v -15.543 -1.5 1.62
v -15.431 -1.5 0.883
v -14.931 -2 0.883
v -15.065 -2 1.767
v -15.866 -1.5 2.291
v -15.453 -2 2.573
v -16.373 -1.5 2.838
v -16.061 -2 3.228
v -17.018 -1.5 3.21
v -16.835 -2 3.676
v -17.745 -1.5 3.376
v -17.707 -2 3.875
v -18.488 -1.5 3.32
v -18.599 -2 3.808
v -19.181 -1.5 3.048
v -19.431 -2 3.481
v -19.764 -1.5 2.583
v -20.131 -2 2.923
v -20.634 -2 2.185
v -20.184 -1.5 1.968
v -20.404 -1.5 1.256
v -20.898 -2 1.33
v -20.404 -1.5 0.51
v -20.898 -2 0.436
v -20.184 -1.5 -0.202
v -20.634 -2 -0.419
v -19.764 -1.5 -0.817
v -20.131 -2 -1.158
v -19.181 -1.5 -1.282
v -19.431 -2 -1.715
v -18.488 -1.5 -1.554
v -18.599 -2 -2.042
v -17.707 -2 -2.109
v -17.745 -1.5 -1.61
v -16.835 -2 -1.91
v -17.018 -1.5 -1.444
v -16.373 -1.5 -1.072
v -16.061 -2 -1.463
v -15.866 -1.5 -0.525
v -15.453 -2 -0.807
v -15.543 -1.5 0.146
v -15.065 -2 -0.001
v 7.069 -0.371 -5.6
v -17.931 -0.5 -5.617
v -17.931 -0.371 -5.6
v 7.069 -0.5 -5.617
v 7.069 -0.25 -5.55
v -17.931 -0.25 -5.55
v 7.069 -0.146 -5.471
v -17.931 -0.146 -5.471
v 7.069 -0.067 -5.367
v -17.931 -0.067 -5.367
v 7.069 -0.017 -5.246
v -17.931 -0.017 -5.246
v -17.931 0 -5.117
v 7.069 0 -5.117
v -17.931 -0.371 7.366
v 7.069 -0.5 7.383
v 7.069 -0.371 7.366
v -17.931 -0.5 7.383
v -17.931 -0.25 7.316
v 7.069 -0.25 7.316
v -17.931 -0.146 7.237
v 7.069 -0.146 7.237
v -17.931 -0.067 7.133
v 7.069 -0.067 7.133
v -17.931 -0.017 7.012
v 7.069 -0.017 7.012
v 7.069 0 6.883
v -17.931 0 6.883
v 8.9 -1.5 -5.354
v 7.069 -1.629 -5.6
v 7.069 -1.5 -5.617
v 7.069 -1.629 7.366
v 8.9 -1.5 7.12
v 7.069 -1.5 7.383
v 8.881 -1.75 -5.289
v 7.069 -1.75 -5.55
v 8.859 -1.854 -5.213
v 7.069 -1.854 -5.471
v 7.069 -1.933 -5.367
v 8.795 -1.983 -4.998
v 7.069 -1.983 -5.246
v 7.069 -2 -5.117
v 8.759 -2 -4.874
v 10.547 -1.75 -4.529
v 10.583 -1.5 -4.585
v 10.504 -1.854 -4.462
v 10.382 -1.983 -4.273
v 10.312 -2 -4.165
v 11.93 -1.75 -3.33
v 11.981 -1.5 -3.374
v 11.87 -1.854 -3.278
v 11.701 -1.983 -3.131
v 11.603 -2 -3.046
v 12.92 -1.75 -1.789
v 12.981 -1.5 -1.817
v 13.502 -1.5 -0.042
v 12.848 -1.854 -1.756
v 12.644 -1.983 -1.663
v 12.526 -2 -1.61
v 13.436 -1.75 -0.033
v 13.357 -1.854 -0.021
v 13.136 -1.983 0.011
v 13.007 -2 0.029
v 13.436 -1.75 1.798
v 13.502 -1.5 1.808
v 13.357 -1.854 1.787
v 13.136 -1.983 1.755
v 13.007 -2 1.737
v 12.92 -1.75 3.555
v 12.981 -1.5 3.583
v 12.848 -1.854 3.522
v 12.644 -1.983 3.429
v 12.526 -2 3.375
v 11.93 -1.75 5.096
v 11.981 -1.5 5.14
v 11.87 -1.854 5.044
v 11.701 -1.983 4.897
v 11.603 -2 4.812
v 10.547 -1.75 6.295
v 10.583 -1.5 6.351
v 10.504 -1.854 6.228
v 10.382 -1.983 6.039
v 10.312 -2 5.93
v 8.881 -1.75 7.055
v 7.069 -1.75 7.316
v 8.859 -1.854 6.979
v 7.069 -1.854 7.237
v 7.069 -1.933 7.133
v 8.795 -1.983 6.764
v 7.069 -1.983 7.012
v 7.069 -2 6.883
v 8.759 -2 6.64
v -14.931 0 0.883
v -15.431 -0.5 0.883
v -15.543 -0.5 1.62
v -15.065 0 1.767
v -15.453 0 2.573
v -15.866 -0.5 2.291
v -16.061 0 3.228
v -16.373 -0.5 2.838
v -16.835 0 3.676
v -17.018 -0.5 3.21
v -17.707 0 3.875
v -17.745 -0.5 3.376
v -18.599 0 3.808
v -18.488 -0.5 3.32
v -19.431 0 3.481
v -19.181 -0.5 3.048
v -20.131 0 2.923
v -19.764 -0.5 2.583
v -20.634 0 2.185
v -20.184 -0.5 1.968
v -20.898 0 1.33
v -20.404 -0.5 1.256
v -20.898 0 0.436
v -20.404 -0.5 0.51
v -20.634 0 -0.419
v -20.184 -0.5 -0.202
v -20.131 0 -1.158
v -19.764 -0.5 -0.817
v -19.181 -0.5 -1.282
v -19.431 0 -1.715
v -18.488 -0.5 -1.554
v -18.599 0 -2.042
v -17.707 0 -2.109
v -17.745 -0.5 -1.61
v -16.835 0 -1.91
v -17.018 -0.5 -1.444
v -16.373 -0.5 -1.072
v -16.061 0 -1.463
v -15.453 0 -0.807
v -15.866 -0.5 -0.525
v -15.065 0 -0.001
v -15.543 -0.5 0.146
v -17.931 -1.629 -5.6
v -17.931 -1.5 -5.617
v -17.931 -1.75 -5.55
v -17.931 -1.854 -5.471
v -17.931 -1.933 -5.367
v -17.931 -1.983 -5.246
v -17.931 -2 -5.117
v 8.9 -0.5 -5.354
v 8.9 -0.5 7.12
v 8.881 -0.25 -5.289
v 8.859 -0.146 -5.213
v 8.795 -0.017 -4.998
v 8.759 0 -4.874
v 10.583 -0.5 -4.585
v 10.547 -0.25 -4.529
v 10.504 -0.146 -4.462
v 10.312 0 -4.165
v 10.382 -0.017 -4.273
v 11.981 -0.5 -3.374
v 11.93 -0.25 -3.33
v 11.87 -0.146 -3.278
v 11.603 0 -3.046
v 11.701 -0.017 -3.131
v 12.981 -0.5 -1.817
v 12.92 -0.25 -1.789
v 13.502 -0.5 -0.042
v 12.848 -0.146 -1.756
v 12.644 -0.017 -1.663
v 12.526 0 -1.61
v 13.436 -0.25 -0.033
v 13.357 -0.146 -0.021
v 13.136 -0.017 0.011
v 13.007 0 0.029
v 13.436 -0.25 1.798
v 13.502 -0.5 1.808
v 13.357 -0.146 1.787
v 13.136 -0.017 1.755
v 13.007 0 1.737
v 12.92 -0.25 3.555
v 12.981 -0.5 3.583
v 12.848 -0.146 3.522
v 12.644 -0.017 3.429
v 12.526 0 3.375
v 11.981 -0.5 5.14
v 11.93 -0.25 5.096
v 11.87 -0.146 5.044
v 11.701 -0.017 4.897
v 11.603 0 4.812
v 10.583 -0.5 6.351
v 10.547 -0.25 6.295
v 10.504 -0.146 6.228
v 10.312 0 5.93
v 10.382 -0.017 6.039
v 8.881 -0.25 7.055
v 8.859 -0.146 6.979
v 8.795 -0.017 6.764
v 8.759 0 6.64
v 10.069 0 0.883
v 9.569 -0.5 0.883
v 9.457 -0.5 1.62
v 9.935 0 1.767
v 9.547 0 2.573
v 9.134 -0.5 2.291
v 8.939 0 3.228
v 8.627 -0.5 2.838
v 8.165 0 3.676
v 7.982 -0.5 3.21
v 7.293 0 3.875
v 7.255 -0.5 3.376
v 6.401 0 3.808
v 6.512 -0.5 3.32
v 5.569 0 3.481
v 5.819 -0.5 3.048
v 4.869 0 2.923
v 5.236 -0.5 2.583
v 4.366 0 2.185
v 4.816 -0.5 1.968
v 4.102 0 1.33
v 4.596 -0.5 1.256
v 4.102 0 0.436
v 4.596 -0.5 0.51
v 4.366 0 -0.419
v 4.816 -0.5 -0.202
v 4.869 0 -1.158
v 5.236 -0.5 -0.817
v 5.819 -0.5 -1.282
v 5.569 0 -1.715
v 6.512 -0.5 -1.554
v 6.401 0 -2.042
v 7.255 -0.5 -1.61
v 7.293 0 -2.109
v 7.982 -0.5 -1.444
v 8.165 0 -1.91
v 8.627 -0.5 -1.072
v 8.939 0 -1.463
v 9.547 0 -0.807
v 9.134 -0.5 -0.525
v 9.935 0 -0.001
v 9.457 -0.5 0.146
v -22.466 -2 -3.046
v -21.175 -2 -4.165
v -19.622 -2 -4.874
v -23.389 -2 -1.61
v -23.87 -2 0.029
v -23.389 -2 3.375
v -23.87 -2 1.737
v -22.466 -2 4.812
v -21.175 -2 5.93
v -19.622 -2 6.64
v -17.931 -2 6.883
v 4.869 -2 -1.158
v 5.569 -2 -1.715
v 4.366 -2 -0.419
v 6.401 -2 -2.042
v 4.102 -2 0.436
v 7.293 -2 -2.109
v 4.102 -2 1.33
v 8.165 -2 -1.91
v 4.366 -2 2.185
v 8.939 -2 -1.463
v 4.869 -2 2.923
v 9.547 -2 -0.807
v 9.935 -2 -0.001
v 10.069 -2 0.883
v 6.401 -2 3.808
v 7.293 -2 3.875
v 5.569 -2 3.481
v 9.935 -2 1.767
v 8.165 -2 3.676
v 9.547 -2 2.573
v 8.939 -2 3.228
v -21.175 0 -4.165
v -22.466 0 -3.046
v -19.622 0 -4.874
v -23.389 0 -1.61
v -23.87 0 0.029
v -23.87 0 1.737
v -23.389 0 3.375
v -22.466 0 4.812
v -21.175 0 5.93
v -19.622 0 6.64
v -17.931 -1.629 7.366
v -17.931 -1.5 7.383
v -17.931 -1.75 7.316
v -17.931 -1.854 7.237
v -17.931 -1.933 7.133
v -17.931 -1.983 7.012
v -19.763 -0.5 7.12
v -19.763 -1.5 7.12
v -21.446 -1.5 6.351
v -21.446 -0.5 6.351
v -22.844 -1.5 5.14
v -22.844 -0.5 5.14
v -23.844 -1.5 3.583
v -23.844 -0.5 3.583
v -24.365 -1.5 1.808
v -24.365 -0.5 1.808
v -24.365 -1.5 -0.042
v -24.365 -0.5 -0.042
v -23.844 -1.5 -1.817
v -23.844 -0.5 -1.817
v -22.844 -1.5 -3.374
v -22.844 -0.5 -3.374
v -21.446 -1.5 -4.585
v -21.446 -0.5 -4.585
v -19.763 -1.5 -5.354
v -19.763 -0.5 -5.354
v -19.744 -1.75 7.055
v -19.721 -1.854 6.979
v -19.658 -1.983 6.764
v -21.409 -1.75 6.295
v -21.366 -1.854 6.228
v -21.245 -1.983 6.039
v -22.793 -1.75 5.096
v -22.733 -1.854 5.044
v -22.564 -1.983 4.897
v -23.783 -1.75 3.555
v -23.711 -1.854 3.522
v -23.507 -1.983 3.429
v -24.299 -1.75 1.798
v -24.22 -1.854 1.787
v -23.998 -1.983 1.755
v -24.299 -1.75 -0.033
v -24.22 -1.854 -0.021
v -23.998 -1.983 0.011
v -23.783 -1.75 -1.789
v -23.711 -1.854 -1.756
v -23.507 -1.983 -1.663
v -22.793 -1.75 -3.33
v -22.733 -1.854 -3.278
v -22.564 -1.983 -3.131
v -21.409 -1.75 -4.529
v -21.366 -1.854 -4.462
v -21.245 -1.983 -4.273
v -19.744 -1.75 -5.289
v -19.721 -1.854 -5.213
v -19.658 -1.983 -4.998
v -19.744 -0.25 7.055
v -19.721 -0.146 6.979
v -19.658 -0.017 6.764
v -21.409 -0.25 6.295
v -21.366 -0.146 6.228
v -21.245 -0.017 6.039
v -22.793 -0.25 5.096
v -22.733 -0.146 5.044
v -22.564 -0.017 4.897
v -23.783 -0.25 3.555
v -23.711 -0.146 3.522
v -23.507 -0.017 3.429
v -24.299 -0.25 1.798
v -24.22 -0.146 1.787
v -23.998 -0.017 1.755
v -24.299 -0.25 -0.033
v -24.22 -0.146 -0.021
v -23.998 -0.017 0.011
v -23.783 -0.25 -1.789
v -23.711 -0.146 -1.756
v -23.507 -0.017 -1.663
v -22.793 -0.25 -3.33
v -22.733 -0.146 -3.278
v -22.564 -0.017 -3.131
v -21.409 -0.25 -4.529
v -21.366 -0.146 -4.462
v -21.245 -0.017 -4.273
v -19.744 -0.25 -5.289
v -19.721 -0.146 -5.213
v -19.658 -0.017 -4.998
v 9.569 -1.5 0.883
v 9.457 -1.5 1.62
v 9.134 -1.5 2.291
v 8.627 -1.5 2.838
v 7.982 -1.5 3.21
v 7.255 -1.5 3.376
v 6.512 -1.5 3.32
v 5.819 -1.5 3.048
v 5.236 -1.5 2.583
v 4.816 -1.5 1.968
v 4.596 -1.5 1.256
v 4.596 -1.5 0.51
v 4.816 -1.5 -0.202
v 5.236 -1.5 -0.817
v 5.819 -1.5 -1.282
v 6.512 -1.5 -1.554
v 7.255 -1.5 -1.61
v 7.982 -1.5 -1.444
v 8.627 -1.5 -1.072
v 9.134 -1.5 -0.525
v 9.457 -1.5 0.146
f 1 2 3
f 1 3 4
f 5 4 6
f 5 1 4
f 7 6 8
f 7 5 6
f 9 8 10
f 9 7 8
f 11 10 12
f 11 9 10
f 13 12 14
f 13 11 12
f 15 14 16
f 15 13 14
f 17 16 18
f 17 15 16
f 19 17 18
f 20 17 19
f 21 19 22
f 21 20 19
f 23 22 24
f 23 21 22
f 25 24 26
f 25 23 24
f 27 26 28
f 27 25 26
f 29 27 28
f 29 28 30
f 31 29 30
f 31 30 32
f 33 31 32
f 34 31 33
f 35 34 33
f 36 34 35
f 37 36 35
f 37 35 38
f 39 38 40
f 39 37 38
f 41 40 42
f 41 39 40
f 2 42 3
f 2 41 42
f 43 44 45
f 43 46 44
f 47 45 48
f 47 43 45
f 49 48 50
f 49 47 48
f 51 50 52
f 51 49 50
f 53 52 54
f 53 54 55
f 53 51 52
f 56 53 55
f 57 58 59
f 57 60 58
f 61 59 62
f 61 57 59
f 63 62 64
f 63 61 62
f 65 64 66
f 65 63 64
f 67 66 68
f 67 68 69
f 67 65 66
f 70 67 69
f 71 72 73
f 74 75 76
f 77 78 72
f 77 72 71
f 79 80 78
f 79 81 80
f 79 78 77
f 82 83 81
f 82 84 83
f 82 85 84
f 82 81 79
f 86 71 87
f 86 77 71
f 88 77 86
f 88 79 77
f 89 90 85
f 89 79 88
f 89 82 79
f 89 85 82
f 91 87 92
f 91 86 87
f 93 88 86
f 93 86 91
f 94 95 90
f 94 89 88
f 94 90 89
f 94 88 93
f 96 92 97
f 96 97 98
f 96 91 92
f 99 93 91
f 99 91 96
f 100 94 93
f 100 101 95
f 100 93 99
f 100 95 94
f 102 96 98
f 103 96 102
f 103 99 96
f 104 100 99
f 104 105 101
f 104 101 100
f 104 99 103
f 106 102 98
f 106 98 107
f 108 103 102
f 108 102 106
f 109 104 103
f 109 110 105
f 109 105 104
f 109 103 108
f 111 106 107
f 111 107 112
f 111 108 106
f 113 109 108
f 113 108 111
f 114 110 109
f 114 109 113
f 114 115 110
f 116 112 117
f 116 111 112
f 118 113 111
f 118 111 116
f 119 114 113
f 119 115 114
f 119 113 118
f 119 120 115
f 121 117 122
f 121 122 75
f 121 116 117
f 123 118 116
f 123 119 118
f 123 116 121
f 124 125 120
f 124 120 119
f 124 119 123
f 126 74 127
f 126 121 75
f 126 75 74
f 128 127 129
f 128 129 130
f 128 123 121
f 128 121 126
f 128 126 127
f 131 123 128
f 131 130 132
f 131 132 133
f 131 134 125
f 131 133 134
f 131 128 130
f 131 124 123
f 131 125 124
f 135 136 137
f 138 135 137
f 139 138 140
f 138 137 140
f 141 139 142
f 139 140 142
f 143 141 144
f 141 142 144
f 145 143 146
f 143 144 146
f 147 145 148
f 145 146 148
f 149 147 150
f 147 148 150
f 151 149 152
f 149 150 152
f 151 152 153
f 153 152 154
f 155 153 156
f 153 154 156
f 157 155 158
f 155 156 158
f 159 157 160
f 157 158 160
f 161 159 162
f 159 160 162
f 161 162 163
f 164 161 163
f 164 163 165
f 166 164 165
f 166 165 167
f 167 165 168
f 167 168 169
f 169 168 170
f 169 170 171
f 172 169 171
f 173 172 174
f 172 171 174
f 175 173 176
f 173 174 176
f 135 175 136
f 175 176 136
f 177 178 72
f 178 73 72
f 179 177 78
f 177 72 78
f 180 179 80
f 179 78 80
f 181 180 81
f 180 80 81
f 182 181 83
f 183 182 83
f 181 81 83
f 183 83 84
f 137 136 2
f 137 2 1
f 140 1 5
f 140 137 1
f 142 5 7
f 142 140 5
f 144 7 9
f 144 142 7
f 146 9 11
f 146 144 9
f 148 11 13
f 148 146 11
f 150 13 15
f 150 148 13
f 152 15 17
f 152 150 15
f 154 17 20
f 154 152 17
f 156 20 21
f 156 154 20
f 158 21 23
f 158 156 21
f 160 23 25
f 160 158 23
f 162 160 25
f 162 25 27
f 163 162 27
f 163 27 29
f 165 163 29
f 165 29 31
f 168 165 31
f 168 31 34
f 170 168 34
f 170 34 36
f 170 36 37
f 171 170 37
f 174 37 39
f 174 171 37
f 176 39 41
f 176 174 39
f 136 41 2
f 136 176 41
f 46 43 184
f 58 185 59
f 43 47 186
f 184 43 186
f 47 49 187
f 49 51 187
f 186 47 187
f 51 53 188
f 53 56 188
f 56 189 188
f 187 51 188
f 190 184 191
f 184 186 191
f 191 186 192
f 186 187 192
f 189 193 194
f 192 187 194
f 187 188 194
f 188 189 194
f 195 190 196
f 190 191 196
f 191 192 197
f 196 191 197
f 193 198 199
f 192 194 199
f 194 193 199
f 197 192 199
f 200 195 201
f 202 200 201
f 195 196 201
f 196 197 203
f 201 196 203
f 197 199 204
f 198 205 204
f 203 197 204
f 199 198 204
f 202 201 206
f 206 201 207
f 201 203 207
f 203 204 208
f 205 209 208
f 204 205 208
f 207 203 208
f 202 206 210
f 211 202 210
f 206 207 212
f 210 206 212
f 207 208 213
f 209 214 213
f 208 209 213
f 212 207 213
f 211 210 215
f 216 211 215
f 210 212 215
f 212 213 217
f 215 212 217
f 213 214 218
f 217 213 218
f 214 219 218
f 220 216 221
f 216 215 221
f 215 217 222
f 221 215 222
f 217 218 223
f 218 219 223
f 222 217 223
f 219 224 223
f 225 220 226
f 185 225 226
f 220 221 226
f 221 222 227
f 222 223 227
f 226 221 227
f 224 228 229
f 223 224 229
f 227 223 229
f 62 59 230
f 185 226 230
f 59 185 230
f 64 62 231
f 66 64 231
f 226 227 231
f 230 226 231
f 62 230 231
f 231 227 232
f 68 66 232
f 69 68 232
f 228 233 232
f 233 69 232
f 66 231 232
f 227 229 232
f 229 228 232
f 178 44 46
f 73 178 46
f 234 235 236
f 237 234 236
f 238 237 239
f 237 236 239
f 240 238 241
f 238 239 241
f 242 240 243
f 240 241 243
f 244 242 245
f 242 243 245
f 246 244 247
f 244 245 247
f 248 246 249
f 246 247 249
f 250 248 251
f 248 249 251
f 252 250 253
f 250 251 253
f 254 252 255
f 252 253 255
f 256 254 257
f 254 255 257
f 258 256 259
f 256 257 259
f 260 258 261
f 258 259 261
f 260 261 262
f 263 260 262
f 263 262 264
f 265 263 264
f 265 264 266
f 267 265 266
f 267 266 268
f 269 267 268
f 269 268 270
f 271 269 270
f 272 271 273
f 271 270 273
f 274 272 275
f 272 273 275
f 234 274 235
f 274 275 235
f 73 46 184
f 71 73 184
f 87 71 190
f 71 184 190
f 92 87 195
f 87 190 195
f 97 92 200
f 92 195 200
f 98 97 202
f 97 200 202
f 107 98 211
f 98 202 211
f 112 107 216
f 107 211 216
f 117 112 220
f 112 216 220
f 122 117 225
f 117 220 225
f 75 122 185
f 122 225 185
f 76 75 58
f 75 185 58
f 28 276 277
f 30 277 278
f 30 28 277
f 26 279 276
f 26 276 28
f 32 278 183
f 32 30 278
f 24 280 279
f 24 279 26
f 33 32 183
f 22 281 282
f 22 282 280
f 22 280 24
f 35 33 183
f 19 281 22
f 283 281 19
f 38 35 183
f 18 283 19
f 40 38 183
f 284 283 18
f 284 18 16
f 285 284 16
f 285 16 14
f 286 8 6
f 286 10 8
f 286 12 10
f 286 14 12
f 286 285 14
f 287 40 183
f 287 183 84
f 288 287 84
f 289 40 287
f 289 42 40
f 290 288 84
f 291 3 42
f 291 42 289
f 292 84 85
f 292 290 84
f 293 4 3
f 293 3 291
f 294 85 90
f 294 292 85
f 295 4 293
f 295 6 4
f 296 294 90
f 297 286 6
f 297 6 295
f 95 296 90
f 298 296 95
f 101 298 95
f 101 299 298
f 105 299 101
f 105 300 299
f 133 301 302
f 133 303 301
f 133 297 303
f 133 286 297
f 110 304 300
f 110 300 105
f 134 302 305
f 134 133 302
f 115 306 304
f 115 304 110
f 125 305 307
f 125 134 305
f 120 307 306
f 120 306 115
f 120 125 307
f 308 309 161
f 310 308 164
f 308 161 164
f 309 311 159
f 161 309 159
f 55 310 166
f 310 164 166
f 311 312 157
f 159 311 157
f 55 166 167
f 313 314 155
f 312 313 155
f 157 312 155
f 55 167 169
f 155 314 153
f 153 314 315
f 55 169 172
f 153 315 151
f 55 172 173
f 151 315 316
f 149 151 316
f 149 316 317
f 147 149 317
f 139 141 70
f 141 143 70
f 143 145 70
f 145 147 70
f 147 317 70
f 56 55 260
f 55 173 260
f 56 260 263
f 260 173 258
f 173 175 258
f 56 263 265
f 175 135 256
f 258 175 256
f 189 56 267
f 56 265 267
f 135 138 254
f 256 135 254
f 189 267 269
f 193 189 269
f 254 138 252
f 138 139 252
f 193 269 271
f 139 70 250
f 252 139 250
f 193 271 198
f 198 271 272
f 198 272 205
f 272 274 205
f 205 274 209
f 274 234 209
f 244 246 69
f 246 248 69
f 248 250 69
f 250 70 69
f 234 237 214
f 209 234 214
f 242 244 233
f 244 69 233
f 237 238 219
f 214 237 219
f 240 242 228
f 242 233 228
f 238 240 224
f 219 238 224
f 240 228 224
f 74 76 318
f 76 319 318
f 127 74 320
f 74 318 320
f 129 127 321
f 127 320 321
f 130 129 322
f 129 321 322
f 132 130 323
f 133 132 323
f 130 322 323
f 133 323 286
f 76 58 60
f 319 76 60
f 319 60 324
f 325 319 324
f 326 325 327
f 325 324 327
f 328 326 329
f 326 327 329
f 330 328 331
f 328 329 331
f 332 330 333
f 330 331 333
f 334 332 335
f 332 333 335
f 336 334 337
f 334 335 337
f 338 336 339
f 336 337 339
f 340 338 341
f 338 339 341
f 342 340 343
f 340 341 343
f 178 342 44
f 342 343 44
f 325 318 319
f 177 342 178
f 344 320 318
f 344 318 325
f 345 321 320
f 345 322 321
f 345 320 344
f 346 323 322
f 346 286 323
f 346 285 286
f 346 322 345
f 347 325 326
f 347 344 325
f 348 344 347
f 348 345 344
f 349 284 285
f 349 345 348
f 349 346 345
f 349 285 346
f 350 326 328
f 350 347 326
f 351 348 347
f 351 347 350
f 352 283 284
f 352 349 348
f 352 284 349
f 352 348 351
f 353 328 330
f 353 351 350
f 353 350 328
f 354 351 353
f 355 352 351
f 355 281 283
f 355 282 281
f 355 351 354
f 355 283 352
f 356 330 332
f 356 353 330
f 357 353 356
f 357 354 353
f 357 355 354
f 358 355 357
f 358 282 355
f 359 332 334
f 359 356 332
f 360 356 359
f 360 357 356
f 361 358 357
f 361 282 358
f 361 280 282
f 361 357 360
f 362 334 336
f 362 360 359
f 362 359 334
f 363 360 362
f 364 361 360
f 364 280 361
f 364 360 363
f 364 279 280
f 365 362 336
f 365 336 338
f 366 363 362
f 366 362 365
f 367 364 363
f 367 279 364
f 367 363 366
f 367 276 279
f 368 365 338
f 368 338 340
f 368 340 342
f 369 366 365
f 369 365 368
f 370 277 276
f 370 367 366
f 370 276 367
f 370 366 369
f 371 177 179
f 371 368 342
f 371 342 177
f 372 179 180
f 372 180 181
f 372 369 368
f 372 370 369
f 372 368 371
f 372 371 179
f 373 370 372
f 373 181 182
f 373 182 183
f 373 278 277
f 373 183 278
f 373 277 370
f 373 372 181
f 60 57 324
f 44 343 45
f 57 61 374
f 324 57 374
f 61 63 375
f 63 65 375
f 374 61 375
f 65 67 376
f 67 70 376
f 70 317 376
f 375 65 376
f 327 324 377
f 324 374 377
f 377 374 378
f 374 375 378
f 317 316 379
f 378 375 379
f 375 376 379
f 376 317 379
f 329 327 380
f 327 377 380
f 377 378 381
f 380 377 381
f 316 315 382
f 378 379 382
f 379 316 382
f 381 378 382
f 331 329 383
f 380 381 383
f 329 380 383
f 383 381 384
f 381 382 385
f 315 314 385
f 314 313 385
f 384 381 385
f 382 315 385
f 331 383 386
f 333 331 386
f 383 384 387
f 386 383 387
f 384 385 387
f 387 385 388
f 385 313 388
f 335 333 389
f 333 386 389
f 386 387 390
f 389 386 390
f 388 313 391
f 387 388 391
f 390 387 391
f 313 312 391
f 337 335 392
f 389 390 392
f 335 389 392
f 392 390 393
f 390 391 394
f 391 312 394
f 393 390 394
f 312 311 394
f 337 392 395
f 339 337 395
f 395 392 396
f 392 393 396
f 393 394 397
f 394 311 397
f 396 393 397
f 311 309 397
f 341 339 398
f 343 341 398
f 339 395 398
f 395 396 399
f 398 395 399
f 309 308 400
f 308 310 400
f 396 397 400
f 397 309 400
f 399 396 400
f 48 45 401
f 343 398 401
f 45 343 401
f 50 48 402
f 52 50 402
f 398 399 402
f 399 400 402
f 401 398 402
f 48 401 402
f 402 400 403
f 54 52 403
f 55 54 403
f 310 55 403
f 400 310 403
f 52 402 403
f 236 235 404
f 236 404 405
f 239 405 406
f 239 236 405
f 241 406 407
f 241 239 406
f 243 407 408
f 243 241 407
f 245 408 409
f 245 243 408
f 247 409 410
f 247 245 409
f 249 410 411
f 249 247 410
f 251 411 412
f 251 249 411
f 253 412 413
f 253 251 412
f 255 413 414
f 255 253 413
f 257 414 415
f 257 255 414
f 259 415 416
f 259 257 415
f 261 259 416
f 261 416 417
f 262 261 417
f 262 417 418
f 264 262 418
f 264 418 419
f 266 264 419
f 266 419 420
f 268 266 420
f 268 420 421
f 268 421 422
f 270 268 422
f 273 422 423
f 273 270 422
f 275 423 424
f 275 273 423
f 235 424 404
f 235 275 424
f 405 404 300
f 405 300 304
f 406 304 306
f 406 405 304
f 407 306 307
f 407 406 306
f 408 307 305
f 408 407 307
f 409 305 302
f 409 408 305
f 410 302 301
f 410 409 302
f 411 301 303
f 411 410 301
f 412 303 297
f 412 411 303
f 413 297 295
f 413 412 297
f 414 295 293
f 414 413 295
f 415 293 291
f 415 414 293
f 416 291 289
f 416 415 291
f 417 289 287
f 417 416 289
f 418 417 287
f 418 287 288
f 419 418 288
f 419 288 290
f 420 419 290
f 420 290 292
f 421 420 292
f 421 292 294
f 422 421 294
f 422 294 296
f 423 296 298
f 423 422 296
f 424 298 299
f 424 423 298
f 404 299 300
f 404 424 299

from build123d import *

# Parameters (mm, degrees)
F0_R     = 2.5
F1_DEPTH = 2
F2_R     = 0.5
F3_SIZE  = 0.5


with BuildPart() as f1:
    # F0 (on Front) → F1 (new body)
    with BuildSketch(Plane.XZ):
        with BuildLine():
            Line((7.068553, 7.382951), (-17.931447, 7.382951))
            ThreePointArc((-17.931447, 7.382951), (-24.431447, 0.882951), (-17.931447, -5.617049))
            Line((-17.931447, -5.617049), (7.068553, -5.617049))
            ThreePointArc((7.068553, -5.617049), (13.568553, 0.882951), (7.068553, 7.382951))
        make_face()
        with Locations((7.068553, 0.882951)):
            Circle(F0_R, mode=Mode.SUBTRACT)
        with Locations((-17.931447, 0.882951)):
            Circle(F0_R, mode=Mode.SUBTRACT)
    extrude(amount=F1_DEPTH)

    # F2
    f2_edges = [f1.edges().sort_by_distance(p)[0] for p in [
        (-5.431447, -2, 7.382951),
        (-24.431447, 0, 0.882951),
    ]]
    fillet(f2_edges, radius=F2_R)

    # F3
    f3_edges = [f1.edges().sort_by_distance(p)[0] for p in [
        (-20.431447, 0, 0.882951),
        (4.568553, 0, 0.882951),
        (-20.431447, -2, 0.882951),
        (4.568553, -2, 0.882951),
    ]]
    chamfer(f3_edges, length=F3_SIZE)


solid = f1.part
